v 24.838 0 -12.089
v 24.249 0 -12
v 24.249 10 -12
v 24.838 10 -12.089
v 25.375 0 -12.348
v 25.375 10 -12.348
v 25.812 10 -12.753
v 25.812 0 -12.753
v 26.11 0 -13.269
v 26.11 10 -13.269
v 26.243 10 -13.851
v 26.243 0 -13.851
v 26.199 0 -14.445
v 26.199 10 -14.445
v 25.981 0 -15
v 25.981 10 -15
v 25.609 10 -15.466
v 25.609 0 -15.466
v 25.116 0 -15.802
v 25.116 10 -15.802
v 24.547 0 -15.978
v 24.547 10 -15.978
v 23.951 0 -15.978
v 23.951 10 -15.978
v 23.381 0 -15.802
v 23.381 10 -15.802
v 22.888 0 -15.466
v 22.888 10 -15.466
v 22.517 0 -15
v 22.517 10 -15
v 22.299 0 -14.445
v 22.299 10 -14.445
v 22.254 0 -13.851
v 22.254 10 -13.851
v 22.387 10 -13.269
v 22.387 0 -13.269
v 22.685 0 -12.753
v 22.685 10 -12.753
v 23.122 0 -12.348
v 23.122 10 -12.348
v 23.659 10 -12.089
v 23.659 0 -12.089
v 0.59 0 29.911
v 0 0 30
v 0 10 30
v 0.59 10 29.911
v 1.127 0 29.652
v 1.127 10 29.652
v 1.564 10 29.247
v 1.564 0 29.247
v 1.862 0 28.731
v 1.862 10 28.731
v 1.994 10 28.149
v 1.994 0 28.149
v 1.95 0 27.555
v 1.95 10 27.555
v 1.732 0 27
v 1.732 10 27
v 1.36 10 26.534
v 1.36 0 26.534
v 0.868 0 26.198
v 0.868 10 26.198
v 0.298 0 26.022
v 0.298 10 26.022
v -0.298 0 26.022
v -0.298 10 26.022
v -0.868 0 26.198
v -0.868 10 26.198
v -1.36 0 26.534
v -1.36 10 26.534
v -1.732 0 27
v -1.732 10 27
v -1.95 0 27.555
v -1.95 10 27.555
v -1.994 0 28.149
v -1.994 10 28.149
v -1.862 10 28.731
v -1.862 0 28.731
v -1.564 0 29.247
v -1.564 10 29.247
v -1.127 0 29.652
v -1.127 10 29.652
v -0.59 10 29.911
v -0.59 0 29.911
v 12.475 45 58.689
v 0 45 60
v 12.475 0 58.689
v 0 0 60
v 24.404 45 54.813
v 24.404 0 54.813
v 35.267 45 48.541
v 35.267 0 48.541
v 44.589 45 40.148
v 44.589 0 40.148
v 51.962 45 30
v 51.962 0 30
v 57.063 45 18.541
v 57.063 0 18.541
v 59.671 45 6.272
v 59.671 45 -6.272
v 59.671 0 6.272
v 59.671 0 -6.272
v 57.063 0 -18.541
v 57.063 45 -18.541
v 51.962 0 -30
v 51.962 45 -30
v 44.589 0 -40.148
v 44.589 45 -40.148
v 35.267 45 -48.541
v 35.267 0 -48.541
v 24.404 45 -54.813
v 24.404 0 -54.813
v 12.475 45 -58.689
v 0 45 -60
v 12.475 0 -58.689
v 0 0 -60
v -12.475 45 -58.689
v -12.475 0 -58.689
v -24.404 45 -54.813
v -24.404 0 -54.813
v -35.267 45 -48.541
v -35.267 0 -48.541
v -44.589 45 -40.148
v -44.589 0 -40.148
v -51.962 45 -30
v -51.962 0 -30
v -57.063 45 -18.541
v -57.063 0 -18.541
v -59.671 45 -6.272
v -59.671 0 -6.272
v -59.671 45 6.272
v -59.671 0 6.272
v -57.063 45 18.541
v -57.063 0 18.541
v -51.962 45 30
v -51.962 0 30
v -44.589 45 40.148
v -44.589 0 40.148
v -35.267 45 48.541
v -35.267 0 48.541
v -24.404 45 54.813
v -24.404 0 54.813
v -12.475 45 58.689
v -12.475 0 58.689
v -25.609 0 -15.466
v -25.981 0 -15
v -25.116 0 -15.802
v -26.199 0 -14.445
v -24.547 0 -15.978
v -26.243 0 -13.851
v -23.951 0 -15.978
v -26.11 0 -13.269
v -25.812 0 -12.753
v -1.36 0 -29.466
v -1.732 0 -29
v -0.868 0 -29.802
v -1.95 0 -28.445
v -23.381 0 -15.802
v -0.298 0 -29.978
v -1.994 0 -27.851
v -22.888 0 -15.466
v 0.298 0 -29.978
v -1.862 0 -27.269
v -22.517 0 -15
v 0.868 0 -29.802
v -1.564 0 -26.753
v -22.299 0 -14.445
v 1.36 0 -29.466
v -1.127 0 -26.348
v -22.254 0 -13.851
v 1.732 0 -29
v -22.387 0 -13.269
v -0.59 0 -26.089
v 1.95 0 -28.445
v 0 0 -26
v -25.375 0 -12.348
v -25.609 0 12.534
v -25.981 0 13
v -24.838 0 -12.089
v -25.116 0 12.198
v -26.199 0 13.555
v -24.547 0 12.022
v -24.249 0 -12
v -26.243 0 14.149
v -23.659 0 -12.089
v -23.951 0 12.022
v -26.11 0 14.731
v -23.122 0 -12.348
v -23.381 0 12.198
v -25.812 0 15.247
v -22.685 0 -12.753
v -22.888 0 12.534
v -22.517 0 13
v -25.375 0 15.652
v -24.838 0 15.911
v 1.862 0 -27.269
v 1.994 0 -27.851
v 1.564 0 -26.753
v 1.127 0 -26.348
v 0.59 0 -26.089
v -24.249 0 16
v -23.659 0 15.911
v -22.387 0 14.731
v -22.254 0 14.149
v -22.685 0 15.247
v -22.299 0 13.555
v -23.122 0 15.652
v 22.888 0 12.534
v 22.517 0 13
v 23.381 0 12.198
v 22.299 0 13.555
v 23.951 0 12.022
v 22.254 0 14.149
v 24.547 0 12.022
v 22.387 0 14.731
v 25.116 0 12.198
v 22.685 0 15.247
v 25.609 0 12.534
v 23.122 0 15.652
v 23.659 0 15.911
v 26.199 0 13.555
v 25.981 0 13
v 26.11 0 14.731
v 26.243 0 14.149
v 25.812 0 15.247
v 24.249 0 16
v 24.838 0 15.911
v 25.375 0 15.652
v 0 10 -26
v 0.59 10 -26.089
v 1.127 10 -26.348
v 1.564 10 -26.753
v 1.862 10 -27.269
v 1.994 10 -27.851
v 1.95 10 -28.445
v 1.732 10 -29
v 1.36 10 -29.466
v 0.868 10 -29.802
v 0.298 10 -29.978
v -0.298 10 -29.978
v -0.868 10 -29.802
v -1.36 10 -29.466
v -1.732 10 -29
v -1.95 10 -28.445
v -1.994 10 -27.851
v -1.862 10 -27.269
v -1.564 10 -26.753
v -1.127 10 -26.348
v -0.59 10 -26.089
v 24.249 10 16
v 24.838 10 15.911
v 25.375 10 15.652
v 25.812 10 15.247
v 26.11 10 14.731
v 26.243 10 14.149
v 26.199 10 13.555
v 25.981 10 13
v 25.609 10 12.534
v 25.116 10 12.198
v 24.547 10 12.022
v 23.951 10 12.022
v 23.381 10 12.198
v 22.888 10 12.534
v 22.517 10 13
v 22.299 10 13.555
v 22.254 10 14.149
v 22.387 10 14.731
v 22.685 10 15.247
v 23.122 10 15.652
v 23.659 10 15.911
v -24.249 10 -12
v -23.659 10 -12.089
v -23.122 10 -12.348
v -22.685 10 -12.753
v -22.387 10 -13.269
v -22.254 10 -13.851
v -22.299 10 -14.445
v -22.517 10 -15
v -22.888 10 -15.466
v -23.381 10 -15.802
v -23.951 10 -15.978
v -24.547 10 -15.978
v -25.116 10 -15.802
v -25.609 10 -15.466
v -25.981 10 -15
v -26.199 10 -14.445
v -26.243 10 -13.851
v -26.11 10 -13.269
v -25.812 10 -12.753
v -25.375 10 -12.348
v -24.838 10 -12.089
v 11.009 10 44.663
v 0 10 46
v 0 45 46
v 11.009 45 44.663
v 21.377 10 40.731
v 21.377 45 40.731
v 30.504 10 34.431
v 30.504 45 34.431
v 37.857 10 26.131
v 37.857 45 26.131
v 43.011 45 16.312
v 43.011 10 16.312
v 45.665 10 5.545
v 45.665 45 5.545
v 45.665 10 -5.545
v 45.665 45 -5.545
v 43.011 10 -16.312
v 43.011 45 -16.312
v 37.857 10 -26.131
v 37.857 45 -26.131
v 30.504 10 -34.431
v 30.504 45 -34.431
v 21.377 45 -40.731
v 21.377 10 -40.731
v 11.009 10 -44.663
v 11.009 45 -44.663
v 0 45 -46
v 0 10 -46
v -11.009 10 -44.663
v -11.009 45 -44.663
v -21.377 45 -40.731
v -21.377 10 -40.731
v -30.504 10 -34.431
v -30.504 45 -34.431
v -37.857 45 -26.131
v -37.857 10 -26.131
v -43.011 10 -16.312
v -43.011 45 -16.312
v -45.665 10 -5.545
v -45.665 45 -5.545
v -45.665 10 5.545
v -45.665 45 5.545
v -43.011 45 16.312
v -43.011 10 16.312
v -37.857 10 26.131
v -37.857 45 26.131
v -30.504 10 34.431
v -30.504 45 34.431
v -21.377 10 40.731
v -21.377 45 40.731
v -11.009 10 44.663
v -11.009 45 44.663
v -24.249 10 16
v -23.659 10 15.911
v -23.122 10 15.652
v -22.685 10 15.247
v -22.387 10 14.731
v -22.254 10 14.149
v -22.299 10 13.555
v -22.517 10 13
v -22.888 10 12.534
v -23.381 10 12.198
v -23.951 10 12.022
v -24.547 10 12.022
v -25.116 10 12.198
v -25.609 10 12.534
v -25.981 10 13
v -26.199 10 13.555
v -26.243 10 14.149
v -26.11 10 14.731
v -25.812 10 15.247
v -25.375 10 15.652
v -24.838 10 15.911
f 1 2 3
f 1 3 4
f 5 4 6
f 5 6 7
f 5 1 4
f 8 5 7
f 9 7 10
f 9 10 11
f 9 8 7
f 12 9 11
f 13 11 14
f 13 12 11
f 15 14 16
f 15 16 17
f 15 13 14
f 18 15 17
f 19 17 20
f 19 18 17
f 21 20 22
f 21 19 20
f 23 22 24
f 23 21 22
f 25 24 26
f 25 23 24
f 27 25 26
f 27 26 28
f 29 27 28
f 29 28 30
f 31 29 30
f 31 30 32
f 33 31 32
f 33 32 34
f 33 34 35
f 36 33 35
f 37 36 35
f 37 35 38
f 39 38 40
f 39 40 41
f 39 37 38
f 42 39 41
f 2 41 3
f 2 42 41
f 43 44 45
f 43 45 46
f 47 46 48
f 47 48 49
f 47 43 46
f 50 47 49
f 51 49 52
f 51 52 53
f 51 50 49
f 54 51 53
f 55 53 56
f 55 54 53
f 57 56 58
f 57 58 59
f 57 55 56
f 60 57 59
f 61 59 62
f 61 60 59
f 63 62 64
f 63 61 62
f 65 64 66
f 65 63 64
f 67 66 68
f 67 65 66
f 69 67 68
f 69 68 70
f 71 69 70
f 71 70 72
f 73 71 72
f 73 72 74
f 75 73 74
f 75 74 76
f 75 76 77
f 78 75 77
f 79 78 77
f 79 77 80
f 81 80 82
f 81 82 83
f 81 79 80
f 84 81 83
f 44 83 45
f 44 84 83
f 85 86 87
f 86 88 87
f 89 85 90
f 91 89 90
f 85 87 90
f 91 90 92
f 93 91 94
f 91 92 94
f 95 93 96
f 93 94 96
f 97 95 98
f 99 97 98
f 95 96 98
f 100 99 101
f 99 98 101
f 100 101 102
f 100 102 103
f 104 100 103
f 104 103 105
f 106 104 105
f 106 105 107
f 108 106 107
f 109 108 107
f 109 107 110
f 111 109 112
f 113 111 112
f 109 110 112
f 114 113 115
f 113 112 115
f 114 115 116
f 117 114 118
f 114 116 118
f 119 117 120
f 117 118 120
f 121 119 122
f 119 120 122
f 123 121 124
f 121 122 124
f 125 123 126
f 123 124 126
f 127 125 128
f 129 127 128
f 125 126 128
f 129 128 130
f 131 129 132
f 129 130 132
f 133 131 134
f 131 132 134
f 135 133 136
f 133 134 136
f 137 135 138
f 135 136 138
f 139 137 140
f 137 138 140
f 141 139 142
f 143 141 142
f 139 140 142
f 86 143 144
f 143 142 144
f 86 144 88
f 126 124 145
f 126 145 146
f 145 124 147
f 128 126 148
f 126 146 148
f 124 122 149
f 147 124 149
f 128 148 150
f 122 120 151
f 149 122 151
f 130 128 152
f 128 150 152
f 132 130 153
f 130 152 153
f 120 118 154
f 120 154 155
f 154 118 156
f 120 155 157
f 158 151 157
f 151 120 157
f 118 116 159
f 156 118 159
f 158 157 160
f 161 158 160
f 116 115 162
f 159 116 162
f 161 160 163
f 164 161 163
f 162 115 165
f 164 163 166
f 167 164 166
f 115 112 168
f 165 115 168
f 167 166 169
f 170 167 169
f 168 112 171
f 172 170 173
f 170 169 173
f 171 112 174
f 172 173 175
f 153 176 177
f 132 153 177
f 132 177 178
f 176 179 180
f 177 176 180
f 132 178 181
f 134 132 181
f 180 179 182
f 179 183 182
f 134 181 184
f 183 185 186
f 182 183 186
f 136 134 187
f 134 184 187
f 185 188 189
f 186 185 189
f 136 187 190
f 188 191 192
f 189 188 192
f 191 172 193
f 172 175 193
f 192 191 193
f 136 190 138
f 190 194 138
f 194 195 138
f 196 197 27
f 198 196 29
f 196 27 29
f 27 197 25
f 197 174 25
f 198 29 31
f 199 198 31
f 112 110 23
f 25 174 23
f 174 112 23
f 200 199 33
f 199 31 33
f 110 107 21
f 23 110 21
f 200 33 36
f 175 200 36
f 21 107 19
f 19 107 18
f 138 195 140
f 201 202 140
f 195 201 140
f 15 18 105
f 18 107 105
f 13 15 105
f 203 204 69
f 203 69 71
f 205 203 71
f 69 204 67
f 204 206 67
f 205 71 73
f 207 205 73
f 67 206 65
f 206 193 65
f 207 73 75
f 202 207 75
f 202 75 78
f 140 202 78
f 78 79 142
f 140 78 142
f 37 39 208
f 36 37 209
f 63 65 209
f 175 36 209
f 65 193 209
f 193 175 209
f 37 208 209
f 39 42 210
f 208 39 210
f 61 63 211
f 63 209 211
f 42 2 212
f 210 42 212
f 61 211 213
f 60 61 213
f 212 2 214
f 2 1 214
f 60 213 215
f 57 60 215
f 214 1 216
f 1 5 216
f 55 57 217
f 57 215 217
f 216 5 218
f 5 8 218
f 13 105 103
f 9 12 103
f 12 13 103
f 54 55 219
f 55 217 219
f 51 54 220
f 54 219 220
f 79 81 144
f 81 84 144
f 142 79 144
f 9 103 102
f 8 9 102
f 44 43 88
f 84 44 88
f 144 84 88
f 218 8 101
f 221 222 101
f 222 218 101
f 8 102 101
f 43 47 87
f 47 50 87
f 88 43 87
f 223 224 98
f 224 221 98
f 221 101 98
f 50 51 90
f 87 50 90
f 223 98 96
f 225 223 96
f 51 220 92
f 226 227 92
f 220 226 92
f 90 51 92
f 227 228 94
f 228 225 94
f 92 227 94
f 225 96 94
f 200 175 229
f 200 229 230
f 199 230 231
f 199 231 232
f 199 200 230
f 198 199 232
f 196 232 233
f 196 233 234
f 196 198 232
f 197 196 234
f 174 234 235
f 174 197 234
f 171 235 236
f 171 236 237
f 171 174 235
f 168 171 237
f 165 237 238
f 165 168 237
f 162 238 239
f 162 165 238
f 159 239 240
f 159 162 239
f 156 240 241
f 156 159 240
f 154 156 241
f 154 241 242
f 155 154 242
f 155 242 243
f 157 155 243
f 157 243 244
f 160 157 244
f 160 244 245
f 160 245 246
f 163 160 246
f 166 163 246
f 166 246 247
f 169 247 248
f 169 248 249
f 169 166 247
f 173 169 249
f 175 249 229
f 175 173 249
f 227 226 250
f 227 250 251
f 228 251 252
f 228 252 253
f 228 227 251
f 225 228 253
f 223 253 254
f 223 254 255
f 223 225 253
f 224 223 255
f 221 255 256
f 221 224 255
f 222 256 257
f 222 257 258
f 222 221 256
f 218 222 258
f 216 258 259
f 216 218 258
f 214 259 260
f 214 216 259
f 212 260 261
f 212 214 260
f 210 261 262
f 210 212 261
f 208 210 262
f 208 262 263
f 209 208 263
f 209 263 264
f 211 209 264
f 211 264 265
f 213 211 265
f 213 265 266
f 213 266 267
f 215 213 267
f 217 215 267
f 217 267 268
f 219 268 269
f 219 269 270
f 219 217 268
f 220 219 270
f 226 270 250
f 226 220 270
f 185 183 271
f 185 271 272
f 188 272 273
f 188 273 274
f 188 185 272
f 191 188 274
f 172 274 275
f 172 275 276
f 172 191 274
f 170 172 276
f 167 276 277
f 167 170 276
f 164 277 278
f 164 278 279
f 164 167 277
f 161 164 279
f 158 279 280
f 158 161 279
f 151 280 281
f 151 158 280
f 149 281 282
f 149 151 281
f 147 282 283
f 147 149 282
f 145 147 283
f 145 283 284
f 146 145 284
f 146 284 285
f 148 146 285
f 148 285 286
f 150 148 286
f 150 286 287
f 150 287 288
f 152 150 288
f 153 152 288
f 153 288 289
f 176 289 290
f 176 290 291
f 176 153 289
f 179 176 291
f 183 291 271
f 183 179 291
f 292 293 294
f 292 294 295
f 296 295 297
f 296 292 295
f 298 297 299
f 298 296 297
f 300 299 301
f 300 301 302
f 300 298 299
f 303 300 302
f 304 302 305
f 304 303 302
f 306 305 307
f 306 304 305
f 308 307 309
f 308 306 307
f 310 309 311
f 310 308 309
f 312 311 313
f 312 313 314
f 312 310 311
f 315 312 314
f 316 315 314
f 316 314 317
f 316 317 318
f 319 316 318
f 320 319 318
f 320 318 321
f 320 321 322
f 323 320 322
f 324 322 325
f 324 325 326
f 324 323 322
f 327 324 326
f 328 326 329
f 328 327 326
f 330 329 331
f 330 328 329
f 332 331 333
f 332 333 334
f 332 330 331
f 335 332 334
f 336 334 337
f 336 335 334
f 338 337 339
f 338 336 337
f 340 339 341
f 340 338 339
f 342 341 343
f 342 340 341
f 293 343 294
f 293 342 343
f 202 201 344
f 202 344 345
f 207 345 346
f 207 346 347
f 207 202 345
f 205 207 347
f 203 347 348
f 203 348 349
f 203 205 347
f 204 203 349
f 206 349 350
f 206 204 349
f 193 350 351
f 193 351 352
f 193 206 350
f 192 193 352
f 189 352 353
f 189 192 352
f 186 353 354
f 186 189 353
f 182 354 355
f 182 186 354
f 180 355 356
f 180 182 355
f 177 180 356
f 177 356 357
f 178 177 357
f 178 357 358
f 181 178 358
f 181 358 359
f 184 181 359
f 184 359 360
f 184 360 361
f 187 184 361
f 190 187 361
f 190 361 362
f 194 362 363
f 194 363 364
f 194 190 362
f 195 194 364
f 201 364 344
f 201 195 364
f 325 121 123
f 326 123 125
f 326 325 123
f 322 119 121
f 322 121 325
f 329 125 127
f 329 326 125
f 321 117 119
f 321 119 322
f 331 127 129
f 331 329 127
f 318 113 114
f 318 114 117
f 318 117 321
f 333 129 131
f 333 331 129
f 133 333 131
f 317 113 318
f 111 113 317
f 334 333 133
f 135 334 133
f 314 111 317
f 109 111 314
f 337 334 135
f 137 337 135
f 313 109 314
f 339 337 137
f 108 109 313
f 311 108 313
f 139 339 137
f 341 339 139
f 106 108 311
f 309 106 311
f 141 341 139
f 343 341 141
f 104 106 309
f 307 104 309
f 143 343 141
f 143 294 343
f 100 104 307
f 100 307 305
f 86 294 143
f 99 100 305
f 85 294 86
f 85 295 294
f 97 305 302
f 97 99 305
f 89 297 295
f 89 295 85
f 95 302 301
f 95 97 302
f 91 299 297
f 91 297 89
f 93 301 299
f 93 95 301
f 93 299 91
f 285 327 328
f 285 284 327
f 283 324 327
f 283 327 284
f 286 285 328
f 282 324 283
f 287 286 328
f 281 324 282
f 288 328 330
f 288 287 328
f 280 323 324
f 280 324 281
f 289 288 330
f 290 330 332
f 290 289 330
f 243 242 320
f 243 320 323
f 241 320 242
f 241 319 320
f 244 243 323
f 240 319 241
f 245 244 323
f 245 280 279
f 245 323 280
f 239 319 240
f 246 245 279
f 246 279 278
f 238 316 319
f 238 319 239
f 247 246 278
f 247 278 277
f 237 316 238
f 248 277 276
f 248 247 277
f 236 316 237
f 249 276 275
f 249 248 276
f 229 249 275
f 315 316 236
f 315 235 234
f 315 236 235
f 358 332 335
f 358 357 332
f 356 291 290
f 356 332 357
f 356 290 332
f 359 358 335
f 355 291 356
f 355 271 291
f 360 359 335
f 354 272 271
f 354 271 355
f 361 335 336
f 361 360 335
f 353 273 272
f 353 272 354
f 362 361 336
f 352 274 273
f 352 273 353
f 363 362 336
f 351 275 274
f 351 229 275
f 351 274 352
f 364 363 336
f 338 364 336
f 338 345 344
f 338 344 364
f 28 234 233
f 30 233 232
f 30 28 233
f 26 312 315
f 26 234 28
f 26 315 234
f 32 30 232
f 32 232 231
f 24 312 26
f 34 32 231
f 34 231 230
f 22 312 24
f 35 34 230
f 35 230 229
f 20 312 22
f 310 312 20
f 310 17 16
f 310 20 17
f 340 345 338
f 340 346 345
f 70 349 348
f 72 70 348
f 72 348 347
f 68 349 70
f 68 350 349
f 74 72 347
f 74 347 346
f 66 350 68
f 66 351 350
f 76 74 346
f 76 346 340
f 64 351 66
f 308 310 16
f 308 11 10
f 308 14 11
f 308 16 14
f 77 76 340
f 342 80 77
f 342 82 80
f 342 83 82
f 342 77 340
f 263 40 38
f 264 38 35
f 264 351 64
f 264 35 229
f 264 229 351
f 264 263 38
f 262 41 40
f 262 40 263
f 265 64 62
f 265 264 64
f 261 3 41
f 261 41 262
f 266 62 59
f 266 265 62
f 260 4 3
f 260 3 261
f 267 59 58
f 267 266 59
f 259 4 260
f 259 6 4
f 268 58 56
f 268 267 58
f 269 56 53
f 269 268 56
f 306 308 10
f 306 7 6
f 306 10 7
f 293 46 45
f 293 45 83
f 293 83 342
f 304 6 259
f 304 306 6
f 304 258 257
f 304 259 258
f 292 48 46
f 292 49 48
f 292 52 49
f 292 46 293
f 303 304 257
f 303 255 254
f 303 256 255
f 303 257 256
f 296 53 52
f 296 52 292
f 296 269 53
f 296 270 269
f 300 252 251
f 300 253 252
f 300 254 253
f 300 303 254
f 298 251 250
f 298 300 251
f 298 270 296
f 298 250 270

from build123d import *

# Parameters (mm, degrees)
SKETCH1_R           = 60
SKETCH1_R_2         = 2
BOSS_EXTRUDE1_DEPTH = 10
SKETCH2_R           = 60
SKETCH2_R_2         = 46
BOSS_EXTRUDE2_DEPTH = 35


with BuildPart() as part:
    # Sketch1 → Boss-Extrude1 (new body)
    with BuildSketch(Plane(origin=(0, 0, 0), x_dir=(1, 0, 0), z_dir=(0, 1, 0))):
        with Locations(Location((0, 0, 0), (0, 0, 270))):
            Circle(SKETCH1_R)
        with Locations(Location((0, 28, 0), (0, 0, 270))):
            Circle(SKETCH1_R_2, mode=Mode.SUBTRACT)
        with Locations(Location((24.248711306, 14, 0), (0, 0, 270))):
            Circle(SKETCH1_R_2, mode=Mode.SUBTRACT)
        with Locations(Location((24.248711306, -14, 0), (0, 0, 270))):
            Circle(SKETCH1_R_2, mode=Mode.SUBTRACT)
        with Locations(Location((0, -28, 0), (0, 0, 270))):
            Circle(SKETCH1_R_2, mode=Mode.SUBTRACT)
        with Locations(Location((-24.248711306, -14, 0), (0, 0, 270))):
            Circle(SKETCH1_R_2, mode=Mode.SUBTRACT)
        with Locations(Location((-24.248711306, 14, 0), (0, 0, 270))):
            Circle(SKETCH1_R_2, mode=Mode.SUBTRACT)
    extrude(amount=BOSS_EXTRUDE1_DEPTH)

    # Sketch2 → Boss-Extrude2 (add)
    with BuildSketch(Plane(origin=(0, 10, 0), x_dir=(1, 0, 0), z_dir=(0, 1, 0))):
        with Locations(Location((0, 0, 0), (0, 0, 270))):
            Circle(SKETCH2_R)
        with Locations(Location((0, 0, 0), (0, 0, 270))):
            Circle(SKETCH2_R_2, mode=Mode.SUBTRACT)
    extrude(amount=BOSS_EXTRUDE2_DEPTH)


solid = part.part
